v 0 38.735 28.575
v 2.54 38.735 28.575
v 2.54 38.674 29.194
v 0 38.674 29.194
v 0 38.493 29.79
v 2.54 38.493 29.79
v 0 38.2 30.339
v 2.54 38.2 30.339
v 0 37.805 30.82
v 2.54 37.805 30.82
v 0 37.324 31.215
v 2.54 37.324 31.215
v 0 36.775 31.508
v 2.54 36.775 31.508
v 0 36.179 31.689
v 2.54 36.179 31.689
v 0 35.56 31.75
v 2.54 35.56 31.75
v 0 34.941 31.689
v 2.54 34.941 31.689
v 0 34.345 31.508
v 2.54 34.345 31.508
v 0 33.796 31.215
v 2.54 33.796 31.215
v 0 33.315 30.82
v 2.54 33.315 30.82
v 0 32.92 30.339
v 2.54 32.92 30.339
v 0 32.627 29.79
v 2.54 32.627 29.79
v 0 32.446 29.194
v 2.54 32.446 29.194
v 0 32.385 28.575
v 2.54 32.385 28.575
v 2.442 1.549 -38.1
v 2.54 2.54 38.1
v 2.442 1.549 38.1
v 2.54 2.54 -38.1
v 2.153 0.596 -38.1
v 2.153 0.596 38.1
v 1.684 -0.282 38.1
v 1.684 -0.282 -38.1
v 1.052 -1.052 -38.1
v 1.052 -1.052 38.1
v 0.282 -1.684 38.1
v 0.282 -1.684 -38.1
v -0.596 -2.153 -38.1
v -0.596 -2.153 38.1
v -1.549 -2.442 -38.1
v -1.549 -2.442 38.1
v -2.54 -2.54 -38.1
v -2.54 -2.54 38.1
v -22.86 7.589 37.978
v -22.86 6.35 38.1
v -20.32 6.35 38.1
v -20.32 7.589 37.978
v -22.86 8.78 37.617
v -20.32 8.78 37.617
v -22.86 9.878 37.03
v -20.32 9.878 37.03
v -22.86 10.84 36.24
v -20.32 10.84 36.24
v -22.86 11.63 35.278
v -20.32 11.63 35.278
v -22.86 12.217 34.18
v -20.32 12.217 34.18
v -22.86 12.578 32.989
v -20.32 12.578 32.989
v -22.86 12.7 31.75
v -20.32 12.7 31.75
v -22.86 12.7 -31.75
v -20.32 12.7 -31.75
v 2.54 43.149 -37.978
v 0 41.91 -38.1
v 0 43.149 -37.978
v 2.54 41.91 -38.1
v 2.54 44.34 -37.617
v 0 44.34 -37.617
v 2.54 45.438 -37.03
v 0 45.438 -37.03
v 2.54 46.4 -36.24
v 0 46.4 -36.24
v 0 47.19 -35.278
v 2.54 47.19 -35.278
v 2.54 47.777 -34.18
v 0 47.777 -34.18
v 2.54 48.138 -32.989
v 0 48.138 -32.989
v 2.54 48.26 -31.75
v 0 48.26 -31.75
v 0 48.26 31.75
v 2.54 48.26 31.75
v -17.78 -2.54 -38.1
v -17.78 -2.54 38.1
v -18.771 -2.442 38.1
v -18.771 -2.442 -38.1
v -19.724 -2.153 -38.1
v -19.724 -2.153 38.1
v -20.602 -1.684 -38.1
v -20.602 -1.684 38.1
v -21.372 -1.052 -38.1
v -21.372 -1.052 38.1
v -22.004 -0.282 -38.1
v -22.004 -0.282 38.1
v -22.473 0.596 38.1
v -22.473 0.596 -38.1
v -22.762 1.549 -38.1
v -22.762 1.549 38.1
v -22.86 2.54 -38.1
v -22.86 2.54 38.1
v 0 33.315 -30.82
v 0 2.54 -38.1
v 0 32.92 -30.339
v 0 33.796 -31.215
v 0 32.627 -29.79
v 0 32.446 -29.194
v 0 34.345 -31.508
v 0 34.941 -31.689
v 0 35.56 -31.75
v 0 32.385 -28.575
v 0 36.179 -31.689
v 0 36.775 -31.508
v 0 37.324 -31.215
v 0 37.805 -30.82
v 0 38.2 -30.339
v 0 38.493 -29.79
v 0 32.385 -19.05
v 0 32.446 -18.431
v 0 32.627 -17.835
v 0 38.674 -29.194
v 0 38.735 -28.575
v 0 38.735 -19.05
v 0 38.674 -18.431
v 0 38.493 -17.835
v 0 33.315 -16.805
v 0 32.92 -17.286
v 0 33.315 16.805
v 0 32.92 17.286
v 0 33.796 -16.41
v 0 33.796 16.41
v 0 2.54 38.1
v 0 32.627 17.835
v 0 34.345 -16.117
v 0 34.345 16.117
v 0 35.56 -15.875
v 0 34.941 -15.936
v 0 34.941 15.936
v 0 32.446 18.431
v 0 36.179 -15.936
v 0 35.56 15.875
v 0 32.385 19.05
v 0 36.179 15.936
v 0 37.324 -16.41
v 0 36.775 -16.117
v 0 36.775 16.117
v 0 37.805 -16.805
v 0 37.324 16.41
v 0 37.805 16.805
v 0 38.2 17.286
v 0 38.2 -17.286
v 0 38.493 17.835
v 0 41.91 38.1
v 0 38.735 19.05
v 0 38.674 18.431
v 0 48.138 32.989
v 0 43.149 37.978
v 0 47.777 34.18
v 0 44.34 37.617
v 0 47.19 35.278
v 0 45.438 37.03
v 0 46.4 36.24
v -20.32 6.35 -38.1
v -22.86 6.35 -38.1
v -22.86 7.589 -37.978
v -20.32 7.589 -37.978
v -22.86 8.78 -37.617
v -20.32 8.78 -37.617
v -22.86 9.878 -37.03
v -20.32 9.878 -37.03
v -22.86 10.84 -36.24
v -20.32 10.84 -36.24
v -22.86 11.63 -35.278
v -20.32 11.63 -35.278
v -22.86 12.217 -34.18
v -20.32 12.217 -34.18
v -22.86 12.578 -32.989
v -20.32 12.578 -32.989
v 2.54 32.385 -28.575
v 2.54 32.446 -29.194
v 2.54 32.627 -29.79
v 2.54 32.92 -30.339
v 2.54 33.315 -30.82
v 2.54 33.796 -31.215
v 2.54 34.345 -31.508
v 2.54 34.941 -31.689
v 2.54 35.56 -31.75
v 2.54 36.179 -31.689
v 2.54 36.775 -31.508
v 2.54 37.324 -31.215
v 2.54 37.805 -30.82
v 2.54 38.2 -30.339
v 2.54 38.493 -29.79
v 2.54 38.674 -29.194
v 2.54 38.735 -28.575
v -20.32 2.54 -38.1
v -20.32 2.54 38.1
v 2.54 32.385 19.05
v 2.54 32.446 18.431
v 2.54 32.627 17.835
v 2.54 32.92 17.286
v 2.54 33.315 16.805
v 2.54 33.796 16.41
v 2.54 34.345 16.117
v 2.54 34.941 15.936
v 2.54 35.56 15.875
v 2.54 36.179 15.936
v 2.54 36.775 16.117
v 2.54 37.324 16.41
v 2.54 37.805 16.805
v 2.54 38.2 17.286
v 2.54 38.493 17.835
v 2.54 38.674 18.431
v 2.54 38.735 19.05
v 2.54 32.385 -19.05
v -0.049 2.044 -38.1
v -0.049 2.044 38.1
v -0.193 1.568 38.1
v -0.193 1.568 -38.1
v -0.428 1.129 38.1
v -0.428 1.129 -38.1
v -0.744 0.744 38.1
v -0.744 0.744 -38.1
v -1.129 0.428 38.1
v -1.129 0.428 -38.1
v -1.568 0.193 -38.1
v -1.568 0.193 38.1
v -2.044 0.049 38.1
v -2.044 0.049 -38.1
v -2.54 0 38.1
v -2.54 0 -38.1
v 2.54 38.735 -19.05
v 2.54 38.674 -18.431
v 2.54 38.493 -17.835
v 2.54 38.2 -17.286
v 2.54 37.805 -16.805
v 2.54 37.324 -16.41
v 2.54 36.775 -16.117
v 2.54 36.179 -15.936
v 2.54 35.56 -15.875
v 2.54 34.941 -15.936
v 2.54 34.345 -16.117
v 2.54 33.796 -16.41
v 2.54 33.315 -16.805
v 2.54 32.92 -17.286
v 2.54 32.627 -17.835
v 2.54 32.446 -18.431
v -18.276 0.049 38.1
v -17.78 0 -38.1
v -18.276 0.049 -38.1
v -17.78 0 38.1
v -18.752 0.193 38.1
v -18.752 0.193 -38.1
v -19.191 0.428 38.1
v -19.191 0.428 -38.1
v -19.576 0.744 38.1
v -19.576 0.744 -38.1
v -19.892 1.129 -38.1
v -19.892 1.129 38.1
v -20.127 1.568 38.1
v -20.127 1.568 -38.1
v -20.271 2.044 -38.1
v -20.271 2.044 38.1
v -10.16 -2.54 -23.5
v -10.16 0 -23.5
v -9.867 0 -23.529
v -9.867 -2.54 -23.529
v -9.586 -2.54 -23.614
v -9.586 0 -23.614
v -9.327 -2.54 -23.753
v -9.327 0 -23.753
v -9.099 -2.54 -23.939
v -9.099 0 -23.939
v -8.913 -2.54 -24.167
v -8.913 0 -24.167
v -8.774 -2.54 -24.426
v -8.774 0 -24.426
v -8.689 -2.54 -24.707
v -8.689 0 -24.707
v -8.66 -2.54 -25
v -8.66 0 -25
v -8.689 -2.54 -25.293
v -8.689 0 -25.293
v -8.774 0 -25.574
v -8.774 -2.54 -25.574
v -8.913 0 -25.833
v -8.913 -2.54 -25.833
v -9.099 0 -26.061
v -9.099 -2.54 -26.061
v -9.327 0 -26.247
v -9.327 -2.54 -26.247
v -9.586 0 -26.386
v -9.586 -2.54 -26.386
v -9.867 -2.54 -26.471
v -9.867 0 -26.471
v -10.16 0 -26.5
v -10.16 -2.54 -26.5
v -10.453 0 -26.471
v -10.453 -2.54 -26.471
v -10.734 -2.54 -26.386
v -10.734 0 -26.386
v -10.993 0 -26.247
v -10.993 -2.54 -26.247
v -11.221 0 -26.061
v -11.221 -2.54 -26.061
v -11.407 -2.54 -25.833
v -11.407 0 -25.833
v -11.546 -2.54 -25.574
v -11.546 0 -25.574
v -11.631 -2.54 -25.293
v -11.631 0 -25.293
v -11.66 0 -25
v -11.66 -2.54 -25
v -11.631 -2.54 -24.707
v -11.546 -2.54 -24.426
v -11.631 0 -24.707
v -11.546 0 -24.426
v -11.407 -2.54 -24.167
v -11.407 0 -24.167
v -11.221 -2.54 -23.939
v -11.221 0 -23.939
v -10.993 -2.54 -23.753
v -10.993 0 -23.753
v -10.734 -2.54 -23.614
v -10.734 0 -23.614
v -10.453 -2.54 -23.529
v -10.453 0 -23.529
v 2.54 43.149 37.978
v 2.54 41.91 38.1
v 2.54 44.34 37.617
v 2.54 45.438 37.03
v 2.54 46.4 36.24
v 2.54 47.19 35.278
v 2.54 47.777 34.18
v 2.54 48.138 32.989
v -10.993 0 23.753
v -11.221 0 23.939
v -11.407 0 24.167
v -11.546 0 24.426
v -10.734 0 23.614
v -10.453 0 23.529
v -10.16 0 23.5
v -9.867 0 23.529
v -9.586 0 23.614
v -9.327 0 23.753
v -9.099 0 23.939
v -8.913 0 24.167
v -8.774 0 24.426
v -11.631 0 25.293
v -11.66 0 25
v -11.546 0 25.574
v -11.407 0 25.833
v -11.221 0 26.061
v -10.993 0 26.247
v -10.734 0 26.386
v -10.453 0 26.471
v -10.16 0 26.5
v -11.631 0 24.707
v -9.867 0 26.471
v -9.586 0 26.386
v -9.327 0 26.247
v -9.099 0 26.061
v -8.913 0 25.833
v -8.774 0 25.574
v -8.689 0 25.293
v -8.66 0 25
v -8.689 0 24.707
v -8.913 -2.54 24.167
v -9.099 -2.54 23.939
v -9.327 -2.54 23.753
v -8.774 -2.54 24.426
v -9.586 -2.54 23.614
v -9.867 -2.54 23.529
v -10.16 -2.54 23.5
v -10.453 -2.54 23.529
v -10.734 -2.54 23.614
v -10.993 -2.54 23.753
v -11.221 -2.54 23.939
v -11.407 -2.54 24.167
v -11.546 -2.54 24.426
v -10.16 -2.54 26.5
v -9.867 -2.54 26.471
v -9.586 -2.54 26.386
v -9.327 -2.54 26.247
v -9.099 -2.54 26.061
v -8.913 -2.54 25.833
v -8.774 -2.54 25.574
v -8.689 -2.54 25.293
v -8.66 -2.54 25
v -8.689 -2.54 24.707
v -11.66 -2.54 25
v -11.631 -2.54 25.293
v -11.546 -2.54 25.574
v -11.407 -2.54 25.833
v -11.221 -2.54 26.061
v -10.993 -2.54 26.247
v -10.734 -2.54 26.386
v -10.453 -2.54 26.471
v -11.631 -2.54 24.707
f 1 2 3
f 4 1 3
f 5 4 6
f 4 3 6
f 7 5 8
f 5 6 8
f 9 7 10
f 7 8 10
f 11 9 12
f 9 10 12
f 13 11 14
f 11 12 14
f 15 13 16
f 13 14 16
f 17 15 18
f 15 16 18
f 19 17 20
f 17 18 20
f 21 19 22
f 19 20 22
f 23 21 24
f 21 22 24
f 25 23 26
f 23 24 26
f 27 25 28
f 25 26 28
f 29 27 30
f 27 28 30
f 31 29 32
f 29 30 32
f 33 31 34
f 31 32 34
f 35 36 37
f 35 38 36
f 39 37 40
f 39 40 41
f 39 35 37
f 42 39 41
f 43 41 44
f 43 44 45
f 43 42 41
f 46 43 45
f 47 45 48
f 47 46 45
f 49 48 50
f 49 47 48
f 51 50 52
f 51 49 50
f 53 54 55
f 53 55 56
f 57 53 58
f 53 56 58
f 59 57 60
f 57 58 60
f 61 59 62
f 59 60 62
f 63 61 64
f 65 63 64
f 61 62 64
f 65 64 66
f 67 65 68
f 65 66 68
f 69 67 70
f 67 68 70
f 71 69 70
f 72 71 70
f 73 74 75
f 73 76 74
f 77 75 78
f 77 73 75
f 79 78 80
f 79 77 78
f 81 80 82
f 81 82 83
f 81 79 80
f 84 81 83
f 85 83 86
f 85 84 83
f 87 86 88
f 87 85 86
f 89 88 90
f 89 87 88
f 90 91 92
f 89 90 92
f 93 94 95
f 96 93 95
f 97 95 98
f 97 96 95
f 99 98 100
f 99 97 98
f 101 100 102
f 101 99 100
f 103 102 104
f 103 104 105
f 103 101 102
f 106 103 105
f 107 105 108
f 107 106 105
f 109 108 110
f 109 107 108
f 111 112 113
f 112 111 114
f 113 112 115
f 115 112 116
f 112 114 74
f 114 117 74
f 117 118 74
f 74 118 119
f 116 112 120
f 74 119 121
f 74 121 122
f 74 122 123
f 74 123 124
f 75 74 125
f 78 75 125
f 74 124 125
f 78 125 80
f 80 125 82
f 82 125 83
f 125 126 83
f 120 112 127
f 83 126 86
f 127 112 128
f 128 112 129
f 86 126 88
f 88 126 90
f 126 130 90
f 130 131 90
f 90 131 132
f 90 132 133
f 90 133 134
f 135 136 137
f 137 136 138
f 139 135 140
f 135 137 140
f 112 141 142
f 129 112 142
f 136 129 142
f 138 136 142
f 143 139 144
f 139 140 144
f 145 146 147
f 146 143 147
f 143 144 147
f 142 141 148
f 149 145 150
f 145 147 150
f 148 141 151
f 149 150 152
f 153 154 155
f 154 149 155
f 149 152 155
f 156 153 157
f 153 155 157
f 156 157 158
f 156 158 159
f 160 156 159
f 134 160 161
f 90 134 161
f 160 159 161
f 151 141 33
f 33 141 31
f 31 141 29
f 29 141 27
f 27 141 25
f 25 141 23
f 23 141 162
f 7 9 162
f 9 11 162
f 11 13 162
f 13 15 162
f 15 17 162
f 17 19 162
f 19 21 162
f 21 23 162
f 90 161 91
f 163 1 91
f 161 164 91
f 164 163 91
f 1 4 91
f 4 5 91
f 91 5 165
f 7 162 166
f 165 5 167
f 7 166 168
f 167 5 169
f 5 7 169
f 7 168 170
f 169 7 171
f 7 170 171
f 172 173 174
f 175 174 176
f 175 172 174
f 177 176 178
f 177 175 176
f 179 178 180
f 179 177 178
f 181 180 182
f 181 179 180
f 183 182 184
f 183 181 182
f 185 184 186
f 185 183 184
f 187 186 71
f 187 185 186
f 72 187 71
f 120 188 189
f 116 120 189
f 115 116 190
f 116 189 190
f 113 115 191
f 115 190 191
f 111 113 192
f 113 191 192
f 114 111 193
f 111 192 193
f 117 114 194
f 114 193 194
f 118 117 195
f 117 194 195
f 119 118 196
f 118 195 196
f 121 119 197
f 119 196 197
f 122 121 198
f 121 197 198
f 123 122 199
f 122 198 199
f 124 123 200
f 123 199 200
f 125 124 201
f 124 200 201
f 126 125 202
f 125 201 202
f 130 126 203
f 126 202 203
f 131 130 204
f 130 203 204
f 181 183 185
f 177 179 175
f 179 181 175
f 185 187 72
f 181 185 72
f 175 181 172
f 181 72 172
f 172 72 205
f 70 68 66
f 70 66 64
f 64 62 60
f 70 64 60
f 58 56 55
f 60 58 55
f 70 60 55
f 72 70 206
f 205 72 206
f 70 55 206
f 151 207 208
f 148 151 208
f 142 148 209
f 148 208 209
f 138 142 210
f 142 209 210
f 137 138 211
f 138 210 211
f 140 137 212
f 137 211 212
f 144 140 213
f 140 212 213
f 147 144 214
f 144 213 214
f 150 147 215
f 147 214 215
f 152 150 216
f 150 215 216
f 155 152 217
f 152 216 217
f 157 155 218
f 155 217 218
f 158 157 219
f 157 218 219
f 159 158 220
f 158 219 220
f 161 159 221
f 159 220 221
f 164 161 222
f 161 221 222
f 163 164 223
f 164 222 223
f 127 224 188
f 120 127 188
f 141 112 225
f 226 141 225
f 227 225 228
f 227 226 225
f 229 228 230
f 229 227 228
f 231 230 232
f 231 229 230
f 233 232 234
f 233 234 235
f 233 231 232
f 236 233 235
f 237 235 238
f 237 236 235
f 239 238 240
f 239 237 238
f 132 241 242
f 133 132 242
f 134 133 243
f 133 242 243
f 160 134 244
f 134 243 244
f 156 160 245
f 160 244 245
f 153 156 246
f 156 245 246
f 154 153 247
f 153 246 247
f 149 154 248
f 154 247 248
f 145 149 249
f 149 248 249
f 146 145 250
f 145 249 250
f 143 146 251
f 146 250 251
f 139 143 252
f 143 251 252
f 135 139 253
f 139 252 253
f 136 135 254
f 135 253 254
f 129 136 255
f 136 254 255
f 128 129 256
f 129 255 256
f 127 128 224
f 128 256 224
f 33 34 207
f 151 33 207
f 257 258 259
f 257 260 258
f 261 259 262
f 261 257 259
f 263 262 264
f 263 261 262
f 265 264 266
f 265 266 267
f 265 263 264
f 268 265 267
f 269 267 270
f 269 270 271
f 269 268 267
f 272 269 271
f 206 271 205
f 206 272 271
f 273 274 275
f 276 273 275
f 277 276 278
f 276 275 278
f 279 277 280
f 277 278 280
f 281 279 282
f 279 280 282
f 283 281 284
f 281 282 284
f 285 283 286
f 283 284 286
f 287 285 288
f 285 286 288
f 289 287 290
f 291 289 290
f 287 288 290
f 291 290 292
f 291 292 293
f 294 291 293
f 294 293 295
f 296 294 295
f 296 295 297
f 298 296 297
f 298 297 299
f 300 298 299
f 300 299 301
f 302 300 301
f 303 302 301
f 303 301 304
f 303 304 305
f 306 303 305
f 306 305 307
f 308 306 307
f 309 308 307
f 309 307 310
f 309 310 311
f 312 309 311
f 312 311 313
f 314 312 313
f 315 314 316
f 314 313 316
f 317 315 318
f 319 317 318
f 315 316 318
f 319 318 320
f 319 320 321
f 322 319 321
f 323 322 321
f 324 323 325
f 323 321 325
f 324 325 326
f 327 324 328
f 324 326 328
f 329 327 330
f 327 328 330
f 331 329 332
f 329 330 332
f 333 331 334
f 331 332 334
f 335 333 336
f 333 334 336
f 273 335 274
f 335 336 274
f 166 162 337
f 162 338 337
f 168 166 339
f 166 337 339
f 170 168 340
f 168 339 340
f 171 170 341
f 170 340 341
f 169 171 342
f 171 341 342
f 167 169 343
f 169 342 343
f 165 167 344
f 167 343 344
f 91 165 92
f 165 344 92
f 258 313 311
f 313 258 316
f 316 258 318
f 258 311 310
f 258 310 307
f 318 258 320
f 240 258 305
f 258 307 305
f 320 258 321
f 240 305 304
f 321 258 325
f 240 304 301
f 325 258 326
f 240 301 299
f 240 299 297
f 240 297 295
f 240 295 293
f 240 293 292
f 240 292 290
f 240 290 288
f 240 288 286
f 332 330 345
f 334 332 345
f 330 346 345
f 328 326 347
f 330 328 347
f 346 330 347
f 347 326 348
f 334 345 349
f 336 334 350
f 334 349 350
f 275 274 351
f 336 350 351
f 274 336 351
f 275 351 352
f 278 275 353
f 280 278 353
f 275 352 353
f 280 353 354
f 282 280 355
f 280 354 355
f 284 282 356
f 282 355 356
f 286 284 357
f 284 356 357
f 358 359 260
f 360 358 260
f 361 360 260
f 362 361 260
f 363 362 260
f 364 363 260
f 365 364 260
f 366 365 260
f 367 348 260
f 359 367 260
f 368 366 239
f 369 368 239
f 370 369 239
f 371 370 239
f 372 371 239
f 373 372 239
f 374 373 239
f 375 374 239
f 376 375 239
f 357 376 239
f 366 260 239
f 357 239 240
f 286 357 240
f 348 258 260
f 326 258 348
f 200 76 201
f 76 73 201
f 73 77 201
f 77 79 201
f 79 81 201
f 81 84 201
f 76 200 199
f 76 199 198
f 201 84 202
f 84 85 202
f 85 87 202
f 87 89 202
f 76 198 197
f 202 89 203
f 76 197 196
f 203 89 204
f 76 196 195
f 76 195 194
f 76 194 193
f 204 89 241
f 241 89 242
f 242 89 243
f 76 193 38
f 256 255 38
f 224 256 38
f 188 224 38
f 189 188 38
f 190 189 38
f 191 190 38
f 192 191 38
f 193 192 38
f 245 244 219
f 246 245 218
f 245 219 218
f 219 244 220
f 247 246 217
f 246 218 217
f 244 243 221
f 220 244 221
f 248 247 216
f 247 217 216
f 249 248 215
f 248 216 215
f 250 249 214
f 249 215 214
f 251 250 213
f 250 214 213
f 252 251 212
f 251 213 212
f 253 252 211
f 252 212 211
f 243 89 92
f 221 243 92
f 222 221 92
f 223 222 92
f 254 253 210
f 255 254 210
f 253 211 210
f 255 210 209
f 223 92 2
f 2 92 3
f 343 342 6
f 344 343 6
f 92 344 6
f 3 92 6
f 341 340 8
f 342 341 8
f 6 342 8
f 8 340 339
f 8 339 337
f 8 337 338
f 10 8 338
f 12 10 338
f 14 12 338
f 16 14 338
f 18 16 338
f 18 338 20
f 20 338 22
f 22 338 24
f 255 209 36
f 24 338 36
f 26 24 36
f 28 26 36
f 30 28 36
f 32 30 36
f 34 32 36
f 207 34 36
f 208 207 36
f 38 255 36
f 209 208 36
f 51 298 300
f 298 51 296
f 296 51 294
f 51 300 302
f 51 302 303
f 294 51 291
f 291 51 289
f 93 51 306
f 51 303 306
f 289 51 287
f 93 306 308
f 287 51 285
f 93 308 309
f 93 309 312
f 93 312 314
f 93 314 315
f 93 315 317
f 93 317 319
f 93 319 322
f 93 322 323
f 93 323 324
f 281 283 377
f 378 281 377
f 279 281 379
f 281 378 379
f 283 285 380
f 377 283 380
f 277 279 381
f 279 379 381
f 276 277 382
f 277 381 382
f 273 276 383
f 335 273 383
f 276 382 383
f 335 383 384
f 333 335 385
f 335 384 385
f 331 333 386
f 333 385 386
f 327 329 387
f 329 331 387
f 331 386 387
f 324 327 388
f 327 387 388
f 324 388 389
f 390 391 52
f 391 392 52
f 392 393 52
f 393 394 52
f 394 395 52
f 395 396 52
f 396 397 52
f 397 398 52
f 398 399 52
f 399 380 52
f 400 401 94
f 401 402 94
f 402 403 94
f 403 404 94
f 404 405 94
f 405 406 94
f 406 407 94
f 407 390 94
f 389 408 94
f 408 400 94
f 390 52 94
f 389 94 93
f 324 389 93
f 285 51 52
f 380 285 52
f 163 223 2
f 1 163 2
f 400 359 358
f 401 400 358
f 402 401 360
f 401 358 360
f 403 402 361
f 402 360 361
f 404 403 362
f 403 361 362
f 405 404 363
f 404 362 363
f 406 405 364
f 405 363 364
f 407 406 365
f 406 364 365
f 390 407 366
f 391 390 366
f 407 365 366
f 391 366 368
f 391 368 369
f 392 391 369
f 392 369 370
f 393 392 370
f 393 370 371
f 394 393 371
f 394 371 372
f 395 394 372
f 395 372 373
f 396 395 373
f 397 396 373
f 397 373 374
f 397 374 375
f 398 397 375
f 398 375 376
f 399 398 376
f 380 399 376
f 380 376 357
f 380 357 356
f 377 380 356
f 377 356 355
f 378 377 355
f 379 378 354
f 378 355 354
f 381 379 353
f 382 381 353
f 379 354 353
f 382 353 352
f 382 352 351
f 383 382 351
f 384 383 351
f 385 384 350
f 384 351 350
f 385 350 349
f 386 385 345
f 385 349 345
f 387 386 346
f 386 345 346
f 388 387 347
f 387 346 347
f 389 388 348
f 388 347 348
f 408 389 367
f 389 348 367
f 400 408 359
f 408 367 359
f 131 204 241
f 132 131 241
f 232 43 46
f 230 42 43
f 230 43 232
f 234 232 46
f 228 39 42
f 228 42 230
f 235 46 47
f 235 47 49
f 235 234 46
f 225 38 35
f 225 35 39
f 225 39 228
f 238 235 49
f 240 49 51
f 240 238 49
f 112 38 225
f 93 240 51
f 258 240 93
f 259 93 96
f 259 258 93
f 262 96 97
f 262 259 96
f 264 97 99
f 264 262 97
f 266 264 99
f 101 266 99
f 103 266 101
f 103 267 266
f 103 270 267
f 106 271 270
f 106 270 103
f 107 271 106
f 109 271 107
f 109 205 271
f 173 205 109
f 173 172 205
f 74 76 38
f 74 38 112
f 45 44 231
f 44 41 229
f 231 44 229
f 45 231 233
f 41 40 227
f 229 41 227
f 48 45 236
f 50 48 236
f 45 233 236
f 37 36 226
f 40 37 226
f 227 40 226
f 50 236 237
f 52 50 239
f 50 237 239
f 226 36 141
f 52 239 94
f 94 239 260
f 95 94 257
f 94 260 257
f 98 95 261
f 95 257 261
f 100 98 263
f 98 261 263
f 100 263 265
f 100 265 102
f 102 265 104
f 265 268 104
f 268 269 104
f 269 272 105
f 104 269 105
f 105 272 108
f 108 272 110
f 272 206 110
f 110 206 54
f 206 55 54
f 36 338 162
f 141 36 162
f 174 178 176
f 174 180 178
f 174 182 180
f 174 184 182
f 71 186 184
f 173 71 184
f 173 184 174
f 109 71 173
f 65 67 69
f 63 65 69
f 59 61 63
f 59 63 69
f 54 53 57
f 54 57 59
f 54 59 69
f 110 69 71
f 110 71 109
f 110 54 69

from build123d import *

# Parameters (mm, degrees)
BOSS_EXTRUDE1_DEPTH      = 38.1
CUT_EXTRUDE1_DEPTH       = 66.598911576
CUT_EXTRUDE1_DEPTH_BACK  = 66.598911576
FILLET1_R                = 6.35
FILLET2_R                = 2.54
FILLET3_R                = 5.08
SCHIZZO1_R               = 1.5
TAGLIO_ESTRUSIONE1_DEPTH = 10


with BuildPart() as part:
    # Sketch1 → Boss-Extrude1 (new, symmetric)
    with BuildSketch(Plane.XY):
        Polygon((0, 0), (0, 48.26), (2.54, 48.26), (2.54, -2.54), (-22.86, -2.54), (-22.86, 0), (-22.86, 12.7), (-20.32, 12.7), (-20.32, 0), align=None)
    extrude(amount=BOSS_EXTRUDE1_DEPTH, both=True)

    # Sketch2 → Cut-Extrude1 (cut, two sides: drawn at the far end of the back side and taken through both)
    with BuildSketch(Plane.ZY.offset(-CUT_EXTRUDE1_DEPTH_BACK)):
        with BuildLine():
            Line((-28.575, 38.735), (-19.05, 38.735))
            ThreePointArc((-19.05, 38.735), (-15.875, 35.56), (-19.05, 32.385))
            Line((-19.05, 32.385), (-28.575, 32.385))
            ThreePointArc((-28.575, 32.385), (-31.75, 35.56), (-28.575, 38.735))
        make_face()
        with BuildLine():
            Line((19.05, 38.735), (28.575, 38.735))
            ThreePointArc((28.575, 38.735), (31.75, 35.56), (28.575, 32.385))
            Line((28.575, 32.385), (19.05, 32.385))
            ThreePointArc((19.05, 32.385), (15.875, 35.56), (19.05, 38.735))
        make_face()
    extrude(amount=CUT_EXTRUDE1_DEPTH + CUT_EXTRUDE1_DEPTH_BACK, mode=Mode.SUBTRACT)

    # Fillet1
    fillet1_edges = [part.edges().sort_by_distance(p)[0] for p in [
        (-21.59, 12.7, 38.1),
        (-21.59, 12.7, -38.1),
        (1.27, 48.26, 38.1),
        (1.27, 48.26, -38.1),
    ]]
    fillet(fillet1_edges, radius=FILLET1_R)

    # Fillet2
    fillet2_edges = [part.edges().sort_by_distance(p)[0] for p in [
        (0, 0, 0),
        (-20.32, 0, 0),
    ]]
    fillet(fillet2_edges, radius=FILLET2_R)

    # Fillet3
    fillet3_edges = [part.edges().sort_by_distance(p)[0] for p in [
        (2.54, -2.54, 0),
        (-22.86, -2.54, 0),
    ]]
    fillet(fillet3_edges, radius=FILLET3_R)

    # Schizzo1 → Taglio-Estrusione1 (cut)
    with BuildSketch(Plane(origin=(0, 0, 0), x_dir=(1, 0, 0), z_dir=(0, 1, 0))):
        with Locations(Location((-10.16, 25, 0), (0, 0, 270))):
            Circle(SCHIZZO1_R)
        with Locations(Location((-10.16, -25, 0), (0, 0, 180))):
            Circle(SCHIZZO1_R)
    extrude(amount=-TAGLIO_ESTRUSIONE1_DEPTH, mode=Mode.SUBTRACT)


solid = part.part
